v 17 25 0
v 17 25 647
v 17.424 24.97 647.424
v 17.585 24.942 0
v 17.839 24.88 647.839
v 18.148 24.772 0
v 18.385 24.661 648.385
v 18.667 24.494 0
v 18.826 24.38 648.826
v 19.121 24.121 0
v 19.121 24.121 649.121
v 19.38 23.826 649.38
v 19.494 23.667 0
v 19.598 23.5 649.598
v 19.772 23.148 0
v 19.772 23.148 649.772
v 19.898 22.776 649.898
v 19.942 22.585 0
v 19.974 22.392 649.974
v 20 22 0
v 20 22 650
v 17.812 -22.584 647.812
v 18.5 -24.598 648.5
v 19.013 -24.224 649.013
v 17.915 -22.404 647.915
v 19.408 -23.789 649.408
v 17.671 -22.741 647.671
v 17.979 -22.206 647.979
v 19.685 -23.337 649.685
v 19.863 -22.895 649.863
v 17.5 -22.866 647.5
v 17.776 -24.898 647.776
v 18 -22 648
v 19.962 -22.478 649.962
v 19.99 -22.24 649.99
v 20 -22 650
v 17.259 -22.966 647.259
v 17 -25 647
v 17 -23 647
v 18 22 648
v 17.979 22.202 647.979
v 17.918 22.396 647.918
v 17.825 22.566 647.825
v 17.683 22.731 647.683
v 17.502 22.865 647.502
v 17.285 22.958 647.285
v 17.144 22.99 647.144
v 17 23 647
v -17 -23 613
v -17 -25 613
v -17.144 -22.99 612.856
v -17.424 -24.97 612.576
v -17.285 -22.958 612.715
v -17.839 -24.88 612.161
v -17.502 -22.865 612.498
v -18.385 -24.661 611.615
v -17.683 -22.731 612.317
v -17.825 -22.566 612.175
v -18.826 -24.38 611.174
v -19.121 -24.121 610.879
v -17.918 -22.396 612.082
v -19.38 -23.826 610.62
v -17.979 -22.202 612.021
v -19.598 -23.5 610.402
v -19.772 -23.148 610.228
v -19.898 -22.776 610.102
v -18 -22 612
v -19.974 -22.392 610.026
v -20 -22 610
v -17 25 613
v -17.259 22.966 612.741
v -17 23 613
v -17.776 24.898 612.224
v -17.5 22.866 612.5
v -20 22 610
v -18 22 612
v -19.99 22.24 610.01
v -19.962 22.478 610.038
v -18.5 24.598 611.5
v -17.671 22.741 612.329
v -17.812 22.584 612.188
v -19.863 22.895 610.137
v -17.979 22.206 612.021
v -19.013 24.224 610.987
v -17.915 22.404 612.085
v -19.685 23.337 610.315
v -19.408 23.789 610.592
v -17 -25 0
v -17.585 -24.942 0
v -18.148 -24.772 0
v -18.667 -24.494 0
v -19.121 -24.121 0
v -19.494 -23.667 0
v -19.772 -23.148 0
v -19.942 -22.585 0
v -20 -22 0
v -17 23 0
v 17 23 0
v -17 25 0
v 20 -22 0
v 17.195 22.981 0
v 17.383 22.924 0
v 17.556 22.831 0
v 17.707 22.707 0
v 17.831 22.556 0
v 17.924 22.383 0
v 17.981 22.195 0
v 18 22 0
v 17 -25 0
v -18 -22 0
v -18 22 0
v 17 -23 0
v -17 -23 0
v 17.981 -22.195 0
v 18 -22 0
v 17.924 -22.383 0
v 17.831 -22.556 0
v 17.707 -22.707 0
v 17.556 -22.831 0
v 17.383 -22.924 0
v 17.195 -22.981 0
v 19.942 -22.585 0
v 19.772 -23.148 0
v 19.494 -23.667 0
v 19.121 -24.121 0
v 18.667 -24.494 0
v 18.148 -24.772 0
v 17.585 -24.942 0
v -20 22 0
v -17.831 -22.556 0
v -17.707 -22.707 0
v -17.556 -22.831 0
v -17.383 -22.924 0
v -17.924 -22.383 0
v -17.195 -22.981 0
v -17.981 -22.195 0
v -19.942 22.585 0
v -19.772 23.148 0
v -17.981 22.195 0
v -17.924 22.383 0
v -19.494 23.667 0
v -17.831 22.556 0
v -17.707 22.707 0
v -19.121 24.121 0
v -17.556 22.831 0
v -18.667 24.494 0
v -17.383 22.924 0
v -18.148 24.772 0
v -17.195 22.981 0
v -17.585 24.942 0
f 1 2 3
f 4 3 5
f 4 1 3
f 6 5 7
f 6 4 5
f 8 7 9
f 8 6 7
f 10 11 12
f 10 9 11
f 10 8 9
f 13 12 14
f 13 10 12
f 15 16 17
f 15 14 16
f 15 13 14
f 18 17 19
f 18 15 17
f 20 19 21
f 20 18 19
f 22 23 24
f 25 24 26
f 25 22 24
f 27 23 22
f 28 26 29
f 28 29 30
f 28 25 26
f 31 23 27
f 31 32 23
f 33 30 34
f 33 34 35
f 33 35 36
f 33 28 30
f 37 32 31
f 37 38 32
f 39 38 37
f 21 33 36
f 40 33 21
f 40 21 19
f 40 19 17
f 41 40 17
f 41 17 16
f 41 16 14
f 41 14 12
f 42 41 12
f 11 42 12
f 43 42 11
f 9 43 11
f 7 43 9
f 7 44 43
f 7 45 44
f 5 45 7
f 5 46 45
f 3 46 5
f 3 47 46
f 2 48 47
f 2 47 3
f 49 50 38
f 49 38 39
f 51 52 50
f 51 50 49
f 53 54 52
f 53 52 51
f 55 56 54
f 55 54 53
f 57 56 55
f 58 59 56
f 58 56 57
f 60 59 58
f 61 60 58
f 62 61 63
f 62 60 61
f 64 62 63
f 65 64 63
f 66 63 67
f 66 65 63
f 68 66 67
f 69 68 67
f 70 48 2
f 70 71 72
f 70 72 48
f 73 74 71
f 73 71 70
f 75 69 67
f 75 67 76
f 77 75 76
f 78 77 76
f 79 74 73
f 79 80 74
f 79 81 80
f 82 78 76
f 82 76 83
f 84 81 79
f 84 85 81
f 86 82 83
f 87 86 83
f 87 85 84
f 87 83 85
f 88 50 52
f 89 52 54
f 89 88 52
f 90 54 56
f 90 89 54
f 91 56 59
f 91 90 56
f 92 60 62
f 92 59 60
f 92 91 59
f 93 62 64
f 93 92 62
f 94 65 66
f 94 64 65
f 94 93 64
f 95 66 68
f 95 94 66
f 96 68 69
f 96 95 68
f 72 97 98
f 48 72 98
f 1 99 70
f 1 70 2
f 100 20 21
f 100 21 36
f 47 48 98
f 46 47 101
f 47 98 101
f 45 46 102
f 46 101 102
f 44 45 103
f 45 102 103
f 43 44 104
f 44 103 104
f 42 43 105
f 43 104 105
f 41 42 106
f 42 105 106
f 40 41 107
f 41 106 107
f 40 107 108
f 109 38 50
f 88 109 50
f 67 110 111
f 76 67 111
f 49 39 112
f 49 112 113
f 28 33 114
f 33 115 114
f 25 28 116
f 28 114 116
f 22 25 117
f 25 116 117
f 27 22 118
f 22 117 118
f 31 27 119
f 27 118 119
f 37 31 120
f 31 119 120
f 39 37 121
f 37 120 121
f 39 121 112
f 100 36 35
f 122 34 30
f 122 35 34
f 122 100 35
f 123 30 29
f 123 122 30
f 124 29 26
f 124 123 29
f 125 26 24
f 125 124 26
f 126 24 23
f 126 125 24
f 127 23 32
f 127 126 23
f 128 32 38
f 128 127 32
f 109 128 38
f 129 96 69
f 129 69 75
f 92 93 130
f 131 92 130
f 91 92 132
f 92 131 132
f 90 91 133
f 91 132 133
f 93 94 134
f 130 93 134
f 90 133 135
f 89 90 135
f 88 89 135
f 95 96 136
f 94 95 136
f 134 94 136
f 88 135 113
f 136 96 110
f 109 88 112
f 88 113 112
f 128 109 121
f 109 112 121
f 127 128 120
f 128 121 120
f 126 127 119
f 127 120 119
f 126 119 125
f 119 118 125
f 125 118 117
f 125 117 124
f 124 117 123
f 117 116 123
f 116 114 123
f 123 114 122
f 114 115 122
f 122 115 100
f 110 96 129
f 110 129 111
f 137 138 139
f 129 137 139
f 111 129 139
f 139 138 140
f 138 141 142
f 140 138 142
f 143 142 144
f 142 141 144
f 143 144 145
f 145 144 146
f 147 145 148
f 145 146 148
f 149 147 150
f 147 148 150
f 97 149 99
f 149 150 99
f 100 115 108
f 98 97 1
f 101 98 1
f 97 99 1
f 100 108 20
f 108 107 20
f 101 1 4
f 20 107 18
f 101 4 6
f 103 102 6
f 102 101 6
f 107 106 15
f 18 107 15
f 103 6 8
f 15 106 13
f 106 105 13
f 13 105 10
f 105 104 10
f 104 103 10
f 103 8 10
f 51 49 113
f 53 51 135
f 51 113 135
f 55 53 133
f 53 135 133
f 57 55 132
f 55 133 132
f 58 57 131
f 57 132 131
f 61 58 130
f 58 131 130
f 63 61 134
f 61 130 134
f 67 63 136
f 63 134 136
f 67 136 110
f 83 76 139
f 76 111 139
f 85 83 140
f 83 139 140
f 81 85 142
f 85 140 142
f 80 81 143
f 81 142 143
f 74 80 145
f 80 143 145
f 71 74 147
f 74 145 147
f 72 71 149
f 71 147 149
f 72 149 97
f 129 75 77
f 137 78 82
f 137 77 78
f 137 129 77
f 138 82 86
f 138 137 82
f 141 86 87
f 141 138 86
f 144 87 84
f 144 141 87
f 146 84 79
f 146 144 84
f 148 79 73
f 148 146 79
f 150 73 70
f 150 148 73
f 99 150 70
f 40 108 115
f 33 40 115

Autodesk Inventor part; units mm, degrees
ref_plane "Start plane" through (0, 0, 0) normal (0, 0, 1) x (1, 0, 0)
ref_plane "End plane" through (0, 0, 650) normal (0, 0, 1) x (1, 0, 0)
sketch "Sketch" plane through (0, 0, 0) normal (0, 0, 1) x (1, 0, 0)
  line L0 (-20, -22) -> (-20, 22)
  line L1 (-17, 25) -> (17, 25)
  line L2 (20, 22) -> (20, -22)
  line L3 (17, -25) -> (-17, -25)
  arc A0 (-20, -22) -> (-17, -25) centre (-17, -22) ccw
  arc A1 (-17, 25) -> (-20, 22) centre (-17, 22) ccw
  arc A2 (20, 22) -> (17, 25) centre (17, 22) ccw
  arc A3 (17, -25) -> (20, -22) centre (17, -22) ccw
  arc A4 (-17, 23) -> (-18, 22) centre (-17, 22) ccw
  line L4 (-17, 23) -> (17, 23)
  arc A5 (18, 22) -> (17, 23) centre (17, 22) ccw
  line L5 (18, 22) -> (18, -22)
  arc A6 (17, -23) -> (18, -22) centre (17, -22) ccw
  line L6 (17, -23) -> (-17, -23)
  arc A7 (-18, -22) -> (-17, -23) centre (-17, -22) ccw
  line L7 (-18, -22) -> (-18, 22)
  line L8 (0, 35.8698) -> (0, -35.8698) construction
  line L9 (-28.8698, 0) -> (28.8698, 0) construction
  dimension "d7" = 3
  dimension "d10" = 50
  dimension "d11" = 40
  dimension "d12" = 2
  dimension "d15" = 25
  dimension "d16" = 20
extrude "Body" add sketch "Sketch" along normal up to surface (650 mm away) from surface at 0
sketch "Sketch3" plane through (0, 0, 0) normal (0, 0, 1) x (1, 0, 0)
  line L0 (0, 0) -> (10, 0)
ref_plane "Work Plane3" through (0, 0, 0) normal (0, -1, 0) x (1, 0, 0)
sketch "Sketch4" plane through (0, 0, 0) normal (0, -1, 0) x (1, 0, 0)
  line L0 (-2, 0) -> (12, 0)
  line L1 (-2, 650) -> (12, 650)
  dimension "d18" = 650
ref_plane "Work Plane5" through (20, 0, 650) normal (-0.7071, 0, 0.7071) x (0.7071, 0, 0.7071)
split "Split2" plane through (20, 0, 650) removes the side toward (-0.7071, 0, 0.7071)
equation "\"d7\" = G_IR"
equation "\"d10\" = G_H"
equation "\"d11\" = G_W"
equation "\"d12\" = G_T"
equation "\"d15\" = 0.5 * d10"
equation "\"d16\" = 0.5 * d11"
equation "\"d3\" = G_L"
equation "\"G_W\" = 40"
equation "\"G_H\" = 50"
equation "\"G_T\" = 2"
equation "\"G_IR\" = 3"
equation "\"G_L\" = d18"
equation "\"G_OFFSET_START\" = 0"
equation "\"G_OFFSET_END\" = 0"
equation "\"d14\" = G_OFFSET_END + B_L"
equation "\"B_L\" = 650"
properties part number "UNI EN 10305-5 - 50 x 40 x 2  - 650" material "Steel, Mild"
